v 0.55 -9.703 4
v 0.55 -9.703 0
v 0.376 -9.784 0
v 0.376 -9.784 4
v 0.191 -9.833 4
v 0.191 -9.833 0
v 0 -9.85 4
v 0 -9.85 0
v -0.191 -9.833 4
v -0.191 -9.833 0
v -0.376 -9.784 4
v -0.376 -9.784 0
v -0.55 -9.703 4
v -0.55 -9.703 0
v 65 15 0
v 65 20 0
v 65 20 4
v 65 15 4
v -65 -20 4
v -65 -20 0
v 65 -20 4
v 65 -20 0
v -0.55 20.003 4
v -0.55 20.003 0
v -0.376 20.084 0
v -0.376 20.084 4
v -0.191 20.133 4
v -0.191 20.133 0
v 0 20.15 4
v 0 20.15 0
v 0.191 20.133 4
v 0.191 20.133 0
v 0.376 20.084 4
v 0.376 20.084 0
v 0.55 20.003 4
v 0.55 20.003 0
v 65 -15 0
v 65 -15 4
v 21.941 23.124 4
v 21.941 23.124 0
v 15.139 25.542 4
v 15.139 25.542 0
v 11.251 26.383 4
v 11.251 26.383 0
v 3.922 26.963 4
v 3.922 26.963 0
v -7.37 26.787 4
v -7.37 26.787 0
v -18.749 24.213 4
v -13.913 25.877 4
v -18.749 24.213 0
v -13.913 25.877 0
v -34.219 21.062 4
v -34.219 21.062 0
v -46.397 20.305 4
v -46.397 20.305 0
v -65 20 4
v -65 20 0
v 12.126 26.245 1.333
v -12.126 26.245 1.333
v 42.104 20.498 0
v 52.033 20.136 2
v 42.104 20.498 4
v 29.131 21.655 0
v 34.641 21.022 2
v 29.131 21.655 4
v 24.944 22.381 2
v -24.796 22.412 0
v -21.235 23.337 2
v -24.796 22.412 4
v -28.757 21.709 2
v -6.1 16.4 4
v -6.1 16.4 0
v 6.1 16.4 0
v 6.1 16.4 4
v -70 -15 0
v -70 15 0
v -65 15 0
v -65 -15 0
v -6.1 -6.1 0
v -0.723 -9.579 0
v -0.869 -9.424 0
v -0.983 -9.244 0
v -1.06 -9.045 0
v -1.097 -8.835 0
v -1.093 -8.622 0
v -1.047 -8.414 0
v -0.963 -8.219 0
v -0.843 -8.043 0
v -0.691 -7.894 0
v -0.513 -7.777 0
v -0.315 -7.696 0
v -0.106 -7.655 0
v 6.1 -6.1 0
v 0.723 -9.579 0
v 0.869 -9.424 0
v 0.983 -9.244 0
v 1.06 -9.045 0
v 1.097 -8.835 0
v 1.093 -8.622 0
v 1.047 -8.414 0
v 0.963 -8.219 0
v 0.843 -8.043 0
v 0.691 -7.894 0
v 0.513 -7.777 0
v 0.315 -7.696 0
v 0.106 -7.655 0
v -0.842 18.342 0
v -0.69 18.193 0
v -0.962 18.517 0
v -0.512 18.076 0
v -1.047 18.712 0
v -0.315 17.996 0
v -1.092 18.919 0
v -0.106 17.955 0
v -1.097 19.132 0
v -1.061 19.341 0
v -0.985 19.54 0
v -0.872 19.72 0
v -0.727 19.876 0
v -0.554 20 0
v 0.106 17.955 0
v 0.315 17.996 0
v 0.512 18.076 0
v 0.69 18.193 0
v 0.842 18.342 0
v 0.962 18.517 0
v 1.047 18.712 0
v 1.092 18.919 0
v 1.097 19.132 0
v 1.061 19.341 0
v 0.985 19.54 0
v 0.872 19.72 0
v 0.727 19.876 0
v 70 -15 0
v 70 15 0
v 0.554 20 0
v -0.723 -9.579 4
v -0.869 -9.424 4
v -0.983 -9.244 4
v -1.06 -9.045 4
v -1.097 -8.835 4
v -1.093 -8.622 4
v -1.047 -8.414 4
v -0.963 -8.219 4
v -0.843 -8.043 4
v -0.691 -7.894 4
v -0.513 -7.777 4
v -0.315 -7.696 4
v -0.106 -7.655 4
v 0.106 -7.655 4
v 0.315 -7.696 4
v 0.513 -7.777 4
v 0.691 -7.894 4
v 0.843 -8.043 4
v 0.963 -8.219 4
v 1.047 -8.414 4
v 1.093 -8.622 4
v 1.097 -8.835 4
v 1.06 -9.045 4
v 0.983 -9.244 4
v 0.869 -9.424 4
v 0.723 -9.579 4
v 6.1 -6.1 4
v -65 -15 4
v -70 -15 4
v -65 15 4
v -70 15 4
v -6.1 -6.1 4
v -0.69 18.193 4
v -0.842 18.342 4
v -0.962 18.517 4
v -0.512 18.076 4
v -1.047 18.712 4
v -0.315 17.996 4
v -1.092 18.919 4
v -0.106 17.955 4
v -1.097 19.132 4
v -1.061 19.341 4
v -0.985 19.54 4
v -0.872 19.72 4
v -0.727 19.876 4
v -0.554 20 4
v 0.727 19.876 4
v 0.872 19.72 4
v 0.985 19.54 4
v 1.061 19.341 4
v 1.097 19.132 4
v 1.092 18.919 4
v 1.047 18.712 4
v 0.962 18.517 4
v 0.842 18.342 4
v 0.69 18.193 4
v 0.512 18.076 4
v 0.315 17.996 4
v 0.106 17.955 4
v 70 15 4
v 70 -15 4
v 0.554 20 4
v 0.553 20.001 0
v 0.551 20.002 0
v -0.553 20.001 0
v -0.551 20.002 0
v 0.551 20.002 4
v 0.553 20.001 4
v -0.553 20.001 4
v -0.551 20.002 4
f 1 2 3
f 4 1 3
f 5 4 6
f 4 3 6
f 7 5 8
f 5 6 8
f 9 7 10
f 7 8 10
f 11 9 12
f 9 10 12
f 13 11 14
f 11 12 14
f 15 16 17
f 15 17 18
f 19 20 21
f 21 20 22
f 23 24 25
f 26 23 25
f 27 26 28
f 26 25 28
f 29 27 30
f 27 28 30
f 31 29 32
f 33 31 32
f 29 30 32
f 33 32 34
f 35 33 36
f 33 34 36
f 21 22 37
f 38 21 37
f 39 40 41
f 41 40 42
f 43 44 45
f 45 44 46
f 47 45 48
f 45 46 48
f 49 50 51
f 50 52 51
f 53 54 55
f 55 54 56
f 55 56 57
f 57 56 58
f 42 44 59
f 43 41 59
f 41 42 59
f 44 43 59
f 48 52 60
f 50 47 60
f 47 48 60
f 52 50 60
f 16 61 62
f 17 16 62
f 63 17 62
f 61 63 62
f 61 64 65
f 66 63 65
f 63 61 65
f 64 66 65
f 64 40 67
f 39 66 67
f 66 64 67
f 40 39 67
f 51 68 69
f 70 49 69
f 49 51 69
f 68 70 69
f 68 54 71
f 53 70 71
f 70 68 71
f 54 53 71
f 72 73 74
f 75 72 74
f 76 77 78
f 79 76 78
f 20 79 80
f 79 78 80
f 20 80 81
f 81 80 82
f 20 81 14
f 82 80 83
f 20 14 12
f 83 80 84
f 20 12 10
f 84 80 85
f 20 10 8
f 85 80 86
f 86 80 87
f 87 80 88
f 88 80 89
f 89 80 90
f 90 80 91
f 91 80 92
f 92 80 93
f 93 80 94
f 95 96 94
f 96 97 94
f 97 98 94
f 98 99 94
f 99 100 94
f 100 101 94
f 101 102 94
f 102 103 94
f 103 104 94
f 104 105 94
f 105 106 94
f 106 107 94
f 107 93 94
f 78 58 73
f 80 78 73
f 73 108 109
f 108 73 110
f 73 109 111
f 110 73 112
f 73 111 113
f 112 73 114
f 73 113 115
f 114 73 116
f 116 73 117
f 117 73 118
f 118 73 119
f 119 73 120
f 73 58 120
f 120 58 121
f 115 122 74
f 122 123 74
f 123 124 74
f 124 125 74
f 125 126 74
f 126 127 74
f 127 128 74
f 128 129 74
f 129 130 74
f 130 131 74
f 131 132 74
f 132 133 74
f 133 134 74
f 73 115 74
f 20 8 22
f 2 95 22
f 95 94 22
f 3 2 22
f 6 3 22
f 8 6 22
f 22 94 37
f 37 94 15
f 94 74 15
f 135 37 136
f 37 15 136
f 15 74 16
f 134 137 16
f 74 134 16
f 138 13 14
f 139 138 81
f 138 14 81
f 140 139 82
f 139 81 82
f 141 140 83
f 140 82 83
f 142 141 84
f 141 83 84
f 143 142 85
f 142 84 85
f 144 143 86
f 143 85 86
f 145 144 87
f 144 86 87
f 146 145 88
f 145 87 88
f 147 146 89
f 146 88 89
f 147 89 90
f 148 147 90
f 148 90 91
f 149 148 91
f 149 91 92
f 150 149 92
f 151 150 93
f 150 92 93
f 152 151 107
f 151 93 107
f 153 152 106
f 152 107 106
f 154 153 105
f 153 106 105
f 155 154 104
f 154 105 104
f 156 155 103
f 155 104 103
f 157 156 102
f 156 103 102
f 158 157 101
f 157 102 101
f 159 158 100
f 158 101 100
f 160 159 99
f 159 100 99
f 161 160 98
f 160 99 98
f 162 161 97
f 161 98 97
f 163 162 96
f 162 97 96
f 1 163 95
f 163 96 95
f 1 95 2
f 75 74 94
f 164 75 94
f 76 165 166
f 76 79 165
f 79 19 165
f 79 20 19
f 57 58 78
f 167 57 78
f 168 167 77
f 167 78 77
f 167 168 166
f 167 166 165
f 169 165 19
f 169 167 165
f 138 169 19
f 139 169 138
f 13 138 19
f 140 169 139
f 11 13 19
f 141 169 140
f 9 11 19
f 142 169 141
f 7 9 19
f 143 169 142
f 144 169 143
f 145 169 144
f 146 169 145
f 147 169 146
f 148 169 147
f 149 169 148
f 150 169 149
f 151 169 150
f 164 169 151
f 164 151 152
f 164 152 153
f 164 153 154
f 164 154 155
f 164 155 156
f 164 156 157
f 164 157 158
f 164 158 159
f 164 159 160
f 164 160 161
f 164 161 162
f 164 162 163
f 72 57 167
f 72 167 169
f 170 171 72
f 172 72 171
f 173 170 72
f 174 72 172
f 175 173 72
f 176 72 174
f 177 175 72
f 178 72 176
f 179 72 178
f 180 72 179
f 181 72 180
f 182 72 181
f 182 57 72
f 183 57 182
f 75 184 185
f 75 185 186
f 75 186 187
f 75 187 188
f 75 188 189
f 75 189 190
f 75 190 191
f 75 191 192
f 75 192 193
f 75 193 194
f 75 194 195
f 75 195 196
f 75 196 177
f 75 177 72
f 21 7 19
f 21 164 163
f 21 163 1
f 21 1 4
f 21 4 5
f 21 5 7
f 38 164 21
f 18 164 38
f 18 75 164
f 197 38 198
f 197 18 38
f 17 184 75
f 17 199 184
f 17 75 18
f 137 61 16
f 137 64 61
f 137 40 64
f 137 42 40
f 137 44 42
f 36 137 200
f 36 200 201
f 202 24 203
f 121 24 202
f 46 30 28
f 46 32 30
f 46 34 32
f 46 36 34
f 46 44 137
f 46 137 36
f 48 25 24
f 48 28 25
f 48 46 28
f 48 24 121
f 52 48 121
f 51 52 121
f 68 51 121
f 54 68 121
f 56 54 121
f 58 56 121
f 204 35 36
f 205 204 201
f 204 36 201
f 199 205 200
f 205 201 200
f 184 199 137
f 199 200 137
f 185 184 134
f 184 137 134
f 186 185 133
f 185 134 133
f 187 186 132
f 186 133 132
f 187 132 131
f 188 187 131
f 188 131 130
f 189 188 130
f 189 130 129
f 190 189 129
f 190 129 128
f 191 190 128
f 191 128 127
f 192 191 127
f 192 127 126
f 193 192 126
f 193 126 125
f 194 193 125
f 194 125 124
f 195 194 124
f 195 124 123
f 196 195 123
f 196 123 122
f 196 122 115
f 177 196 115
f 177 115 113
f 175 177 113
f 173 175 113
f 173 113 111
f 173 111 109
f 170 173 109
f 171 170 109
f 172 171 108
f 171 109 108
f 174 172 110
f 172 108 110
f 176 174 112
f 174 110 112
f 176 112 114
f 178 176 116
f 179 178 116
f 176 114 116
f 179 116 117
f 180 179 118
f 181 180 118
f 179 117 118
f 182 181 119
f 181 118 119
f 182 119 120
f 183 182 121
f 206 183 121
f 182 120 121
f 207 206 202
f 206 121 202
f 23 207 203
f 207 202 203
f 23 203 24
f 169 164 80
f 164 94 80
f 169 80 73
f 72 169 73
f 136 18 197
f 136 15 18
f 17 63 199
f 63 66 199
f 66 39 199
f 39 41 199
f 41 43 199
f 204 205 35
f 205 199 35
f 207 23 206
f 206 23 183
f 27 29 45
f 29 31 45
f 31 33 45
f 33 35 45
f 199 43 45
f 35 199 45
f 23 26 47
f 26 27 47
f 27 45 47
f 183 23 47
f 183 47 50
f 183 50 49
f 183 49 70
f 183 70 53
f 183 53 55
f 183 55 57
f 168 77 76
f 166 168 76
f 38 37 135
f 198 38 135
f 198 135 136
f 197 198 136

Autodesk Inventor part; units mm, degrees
ref_plane "YZ Plane" through (0, 0, 0) normal (1, 0, 0) x (0, 1, 0)
ref_plane "XZ Plane" through (0, 0, 0) normal (0, 1, 0) x (-1, 0, 0)
ref_plane "XY Plane" through (0, 0, 0) normal (0, 0, 1) x (1, 0, 0)
sketch "Sketch1" plane through (0, 0, 0) normal (0, 0, 1) x (1, 0, 0)
  line L0 (-65, -20) -> (65, -20)
  line L1 (70, -15) -> (70, 15)
  line L2 (65, 20) -> (-65, 20)
  line L3 (-70, 15) -> (-70, -15)
  line L4 (65, 20) -> (65, 15)
  line L5 (65, 15) -> (70, 15)
  line L6 (0, 20) -> (0, -20)
  line L7 (65, -20) -> (65, -15)
  line L8 (65, -15) -> (70, -15)
  line L9 (-65, 20) -> (-65, 15)
  line L10 (-65, 15) -> (-70, 15)
  line L11 (-65, -20) -> (-65, -15)
  line L12 (-65, -15) -> (-70, -15)
  point P0 (0, 0)
extrude "Extrusion1" add sketch "Sketch1" along normal blind 4
sketch "Sketch2" plane through (0, 0, 0) normal (0, 0, -1) x (-1, 0, 0)
  arc A0 (-0.55, 20.0026) -> (0.55, 20.0026) centre (0, 19.05) ccw
  line L0 (-0.55, 21.2) -> (-5.25, 21.2)
  line L1 (5.25, 21.2) -> (0.55, 21.2)
  line L2 (6.1, 15.55) -> (6.1, 20.35)
  line L3 (0.55, -10.9) -> (5.25, -10.9)
  line L4 (-5.25, -10.9) -> (-0.55, -10.9)
  arc A1 (0.55, -9.7026) -> (-0.55, -9.7026) centre (0, -8.75) ccw
  line L5 (0.55, -10.9) -> (0.55, -9.7026)
  line L6 (-0.55, -9.7026) -> (-0.55, -10.9)
  line L7 (-6.1, -5.25) -> (-6.1, -10.05)
  line L8 (-6.1, 20.35) -> (-6.1, 15.55)
  arc A2 (-5.25, 21.2) -> (-6.1, 20.35) centre (-5.25, 20.35) ccw
  line L9 (-0.55, 21.2) -> (-0.55, 20.0026)
  line L10 (0.55, 20.0026) -> (0.55, 21.2)
  arc A3 (6.1, 20.35) -> (5.25, 21.2) centre (5.25, 20.35) ccw
  arc A4 (5.25, -10.9) -> (6.1, -10.05) centre (5.25, -10.05) ccw
  line L11 (6.1, -10.05) -> (6.1, -5.25)
  line L12 (6.1, -1.562) -> (6.1, -5.25)
  line L13 (6.1, 15.55) -> (6.1, 1.562)
  circle A5 centre (0, 0) radius 2.25
  line L14 (-6.1, -5.25) -> (-6.1, -1.562)
  line L15 (-6.1, 1.562) -> (-6.1, 15.55)
  line L16 (5.25, 16.4) -> (-5.25, 16.4)
  line L17 (-5.25, -6.1) -> (5.25, -6.1)
  arc A6 (5.25, -6.1) -> (6.1, -5.25) centre (5.25, -5.25) ccw
  arc A7 (-6.1, -5.25) -> (-5.25, -6.1) centre (-5.25, -5.25) ccw
  arc A8 (-6.1, -10.05) -> (-5.25, -10.9) centre (-5.25, -10.05) ccw
  arc A9 (6.1, 15.55) -> (5.25, 16.4) centre (5.25, 15.55) ccw
  arc A10 (-5.25, 16.4) -> (-6.1, 15.55) centre (-5.25, 15.55) ccw
  line L18 (-6.1, 1.562) -> (-6.1, -1.562)
  line L19 (6.1, 1.562) -> (6.1, -1.562)
  circle A11 centre (0, -8.75) radius 1.1
  circle A12 centre (0, 19.05) radius 1.1
  line L20 (-6.1, 15.55) -> (-6.1, 16.4)
  line L21 (-5.25, 16.4) -> (-6.1, 16.4)
  line L22 (5.25, 16.4) -> (6.1, 16.4)
  line L23 (6.1, 15.55) -> (6.1, 16.4)
  line L24 (5.25, -6.1) -> (6.1, -6.1)
  line L25 (-5.25, -6.1) -> (-6.1, -6.1)
  point P0 (-5.25, 21.2)
  point P1 (3.6026, 15)
  point P2 (3.95, 9.45)
  point P3 (0.55, 20.0026)
  point P4 (-0.55, -9.7026)
  point P5 (0.55, -9.7026)
sketch "Sketch3" plane through (0, 0, 0) normal (0, 0, -1) x (-1, 0, 0)
  line L0 (-65, 20) -> (65, 20) projected
  line L1 (-65, 20) -> (-20.7877, 20) construction
  line L2 (-20.7877, 20) -> (-20.7877, 27.1367) construction
  line L3 (-20.7877, 27.1367) -> (0, 27.1367) construction
  line L4 (0, 27.1367) -> (20.7877, 27.1367) construction
  line L5 (20.7877, 27.1367) -> (20.7877, 20) construction
  line L6 (20.7877, 20) -> (65, 20) construction
  spline S0 degree 4 poles (-65, 20) (-20.7877, 20) (-20.7877, 27.1367) (0, 27.1367) (20.7877, 27.1367) (20.7877, 20) (65, 20) knots 1 1 1 1 1 2 3 4 4 4 4 4
  line L7 (-65, 15) -> (-65, 20) projected
  line L8 (-65, 20) -> (65, 20)
  point P0 (0, 0)
extrude "Extrusion2" add sketch "Sketch3" against normal up to surface (4 mm away)
extrude "Extrusion3" cut sketch "Sketch2" against normal through all contours A12 A0 | L21 A10 L8 | A10 L16 A9 L13 L19 L12 A6 L17 A7 L14 L18 L15 | L2 A9 L22 | A7 L25 L7 | L11 L24 A6 | A1 A11 | A5
properties part number "sholder"
